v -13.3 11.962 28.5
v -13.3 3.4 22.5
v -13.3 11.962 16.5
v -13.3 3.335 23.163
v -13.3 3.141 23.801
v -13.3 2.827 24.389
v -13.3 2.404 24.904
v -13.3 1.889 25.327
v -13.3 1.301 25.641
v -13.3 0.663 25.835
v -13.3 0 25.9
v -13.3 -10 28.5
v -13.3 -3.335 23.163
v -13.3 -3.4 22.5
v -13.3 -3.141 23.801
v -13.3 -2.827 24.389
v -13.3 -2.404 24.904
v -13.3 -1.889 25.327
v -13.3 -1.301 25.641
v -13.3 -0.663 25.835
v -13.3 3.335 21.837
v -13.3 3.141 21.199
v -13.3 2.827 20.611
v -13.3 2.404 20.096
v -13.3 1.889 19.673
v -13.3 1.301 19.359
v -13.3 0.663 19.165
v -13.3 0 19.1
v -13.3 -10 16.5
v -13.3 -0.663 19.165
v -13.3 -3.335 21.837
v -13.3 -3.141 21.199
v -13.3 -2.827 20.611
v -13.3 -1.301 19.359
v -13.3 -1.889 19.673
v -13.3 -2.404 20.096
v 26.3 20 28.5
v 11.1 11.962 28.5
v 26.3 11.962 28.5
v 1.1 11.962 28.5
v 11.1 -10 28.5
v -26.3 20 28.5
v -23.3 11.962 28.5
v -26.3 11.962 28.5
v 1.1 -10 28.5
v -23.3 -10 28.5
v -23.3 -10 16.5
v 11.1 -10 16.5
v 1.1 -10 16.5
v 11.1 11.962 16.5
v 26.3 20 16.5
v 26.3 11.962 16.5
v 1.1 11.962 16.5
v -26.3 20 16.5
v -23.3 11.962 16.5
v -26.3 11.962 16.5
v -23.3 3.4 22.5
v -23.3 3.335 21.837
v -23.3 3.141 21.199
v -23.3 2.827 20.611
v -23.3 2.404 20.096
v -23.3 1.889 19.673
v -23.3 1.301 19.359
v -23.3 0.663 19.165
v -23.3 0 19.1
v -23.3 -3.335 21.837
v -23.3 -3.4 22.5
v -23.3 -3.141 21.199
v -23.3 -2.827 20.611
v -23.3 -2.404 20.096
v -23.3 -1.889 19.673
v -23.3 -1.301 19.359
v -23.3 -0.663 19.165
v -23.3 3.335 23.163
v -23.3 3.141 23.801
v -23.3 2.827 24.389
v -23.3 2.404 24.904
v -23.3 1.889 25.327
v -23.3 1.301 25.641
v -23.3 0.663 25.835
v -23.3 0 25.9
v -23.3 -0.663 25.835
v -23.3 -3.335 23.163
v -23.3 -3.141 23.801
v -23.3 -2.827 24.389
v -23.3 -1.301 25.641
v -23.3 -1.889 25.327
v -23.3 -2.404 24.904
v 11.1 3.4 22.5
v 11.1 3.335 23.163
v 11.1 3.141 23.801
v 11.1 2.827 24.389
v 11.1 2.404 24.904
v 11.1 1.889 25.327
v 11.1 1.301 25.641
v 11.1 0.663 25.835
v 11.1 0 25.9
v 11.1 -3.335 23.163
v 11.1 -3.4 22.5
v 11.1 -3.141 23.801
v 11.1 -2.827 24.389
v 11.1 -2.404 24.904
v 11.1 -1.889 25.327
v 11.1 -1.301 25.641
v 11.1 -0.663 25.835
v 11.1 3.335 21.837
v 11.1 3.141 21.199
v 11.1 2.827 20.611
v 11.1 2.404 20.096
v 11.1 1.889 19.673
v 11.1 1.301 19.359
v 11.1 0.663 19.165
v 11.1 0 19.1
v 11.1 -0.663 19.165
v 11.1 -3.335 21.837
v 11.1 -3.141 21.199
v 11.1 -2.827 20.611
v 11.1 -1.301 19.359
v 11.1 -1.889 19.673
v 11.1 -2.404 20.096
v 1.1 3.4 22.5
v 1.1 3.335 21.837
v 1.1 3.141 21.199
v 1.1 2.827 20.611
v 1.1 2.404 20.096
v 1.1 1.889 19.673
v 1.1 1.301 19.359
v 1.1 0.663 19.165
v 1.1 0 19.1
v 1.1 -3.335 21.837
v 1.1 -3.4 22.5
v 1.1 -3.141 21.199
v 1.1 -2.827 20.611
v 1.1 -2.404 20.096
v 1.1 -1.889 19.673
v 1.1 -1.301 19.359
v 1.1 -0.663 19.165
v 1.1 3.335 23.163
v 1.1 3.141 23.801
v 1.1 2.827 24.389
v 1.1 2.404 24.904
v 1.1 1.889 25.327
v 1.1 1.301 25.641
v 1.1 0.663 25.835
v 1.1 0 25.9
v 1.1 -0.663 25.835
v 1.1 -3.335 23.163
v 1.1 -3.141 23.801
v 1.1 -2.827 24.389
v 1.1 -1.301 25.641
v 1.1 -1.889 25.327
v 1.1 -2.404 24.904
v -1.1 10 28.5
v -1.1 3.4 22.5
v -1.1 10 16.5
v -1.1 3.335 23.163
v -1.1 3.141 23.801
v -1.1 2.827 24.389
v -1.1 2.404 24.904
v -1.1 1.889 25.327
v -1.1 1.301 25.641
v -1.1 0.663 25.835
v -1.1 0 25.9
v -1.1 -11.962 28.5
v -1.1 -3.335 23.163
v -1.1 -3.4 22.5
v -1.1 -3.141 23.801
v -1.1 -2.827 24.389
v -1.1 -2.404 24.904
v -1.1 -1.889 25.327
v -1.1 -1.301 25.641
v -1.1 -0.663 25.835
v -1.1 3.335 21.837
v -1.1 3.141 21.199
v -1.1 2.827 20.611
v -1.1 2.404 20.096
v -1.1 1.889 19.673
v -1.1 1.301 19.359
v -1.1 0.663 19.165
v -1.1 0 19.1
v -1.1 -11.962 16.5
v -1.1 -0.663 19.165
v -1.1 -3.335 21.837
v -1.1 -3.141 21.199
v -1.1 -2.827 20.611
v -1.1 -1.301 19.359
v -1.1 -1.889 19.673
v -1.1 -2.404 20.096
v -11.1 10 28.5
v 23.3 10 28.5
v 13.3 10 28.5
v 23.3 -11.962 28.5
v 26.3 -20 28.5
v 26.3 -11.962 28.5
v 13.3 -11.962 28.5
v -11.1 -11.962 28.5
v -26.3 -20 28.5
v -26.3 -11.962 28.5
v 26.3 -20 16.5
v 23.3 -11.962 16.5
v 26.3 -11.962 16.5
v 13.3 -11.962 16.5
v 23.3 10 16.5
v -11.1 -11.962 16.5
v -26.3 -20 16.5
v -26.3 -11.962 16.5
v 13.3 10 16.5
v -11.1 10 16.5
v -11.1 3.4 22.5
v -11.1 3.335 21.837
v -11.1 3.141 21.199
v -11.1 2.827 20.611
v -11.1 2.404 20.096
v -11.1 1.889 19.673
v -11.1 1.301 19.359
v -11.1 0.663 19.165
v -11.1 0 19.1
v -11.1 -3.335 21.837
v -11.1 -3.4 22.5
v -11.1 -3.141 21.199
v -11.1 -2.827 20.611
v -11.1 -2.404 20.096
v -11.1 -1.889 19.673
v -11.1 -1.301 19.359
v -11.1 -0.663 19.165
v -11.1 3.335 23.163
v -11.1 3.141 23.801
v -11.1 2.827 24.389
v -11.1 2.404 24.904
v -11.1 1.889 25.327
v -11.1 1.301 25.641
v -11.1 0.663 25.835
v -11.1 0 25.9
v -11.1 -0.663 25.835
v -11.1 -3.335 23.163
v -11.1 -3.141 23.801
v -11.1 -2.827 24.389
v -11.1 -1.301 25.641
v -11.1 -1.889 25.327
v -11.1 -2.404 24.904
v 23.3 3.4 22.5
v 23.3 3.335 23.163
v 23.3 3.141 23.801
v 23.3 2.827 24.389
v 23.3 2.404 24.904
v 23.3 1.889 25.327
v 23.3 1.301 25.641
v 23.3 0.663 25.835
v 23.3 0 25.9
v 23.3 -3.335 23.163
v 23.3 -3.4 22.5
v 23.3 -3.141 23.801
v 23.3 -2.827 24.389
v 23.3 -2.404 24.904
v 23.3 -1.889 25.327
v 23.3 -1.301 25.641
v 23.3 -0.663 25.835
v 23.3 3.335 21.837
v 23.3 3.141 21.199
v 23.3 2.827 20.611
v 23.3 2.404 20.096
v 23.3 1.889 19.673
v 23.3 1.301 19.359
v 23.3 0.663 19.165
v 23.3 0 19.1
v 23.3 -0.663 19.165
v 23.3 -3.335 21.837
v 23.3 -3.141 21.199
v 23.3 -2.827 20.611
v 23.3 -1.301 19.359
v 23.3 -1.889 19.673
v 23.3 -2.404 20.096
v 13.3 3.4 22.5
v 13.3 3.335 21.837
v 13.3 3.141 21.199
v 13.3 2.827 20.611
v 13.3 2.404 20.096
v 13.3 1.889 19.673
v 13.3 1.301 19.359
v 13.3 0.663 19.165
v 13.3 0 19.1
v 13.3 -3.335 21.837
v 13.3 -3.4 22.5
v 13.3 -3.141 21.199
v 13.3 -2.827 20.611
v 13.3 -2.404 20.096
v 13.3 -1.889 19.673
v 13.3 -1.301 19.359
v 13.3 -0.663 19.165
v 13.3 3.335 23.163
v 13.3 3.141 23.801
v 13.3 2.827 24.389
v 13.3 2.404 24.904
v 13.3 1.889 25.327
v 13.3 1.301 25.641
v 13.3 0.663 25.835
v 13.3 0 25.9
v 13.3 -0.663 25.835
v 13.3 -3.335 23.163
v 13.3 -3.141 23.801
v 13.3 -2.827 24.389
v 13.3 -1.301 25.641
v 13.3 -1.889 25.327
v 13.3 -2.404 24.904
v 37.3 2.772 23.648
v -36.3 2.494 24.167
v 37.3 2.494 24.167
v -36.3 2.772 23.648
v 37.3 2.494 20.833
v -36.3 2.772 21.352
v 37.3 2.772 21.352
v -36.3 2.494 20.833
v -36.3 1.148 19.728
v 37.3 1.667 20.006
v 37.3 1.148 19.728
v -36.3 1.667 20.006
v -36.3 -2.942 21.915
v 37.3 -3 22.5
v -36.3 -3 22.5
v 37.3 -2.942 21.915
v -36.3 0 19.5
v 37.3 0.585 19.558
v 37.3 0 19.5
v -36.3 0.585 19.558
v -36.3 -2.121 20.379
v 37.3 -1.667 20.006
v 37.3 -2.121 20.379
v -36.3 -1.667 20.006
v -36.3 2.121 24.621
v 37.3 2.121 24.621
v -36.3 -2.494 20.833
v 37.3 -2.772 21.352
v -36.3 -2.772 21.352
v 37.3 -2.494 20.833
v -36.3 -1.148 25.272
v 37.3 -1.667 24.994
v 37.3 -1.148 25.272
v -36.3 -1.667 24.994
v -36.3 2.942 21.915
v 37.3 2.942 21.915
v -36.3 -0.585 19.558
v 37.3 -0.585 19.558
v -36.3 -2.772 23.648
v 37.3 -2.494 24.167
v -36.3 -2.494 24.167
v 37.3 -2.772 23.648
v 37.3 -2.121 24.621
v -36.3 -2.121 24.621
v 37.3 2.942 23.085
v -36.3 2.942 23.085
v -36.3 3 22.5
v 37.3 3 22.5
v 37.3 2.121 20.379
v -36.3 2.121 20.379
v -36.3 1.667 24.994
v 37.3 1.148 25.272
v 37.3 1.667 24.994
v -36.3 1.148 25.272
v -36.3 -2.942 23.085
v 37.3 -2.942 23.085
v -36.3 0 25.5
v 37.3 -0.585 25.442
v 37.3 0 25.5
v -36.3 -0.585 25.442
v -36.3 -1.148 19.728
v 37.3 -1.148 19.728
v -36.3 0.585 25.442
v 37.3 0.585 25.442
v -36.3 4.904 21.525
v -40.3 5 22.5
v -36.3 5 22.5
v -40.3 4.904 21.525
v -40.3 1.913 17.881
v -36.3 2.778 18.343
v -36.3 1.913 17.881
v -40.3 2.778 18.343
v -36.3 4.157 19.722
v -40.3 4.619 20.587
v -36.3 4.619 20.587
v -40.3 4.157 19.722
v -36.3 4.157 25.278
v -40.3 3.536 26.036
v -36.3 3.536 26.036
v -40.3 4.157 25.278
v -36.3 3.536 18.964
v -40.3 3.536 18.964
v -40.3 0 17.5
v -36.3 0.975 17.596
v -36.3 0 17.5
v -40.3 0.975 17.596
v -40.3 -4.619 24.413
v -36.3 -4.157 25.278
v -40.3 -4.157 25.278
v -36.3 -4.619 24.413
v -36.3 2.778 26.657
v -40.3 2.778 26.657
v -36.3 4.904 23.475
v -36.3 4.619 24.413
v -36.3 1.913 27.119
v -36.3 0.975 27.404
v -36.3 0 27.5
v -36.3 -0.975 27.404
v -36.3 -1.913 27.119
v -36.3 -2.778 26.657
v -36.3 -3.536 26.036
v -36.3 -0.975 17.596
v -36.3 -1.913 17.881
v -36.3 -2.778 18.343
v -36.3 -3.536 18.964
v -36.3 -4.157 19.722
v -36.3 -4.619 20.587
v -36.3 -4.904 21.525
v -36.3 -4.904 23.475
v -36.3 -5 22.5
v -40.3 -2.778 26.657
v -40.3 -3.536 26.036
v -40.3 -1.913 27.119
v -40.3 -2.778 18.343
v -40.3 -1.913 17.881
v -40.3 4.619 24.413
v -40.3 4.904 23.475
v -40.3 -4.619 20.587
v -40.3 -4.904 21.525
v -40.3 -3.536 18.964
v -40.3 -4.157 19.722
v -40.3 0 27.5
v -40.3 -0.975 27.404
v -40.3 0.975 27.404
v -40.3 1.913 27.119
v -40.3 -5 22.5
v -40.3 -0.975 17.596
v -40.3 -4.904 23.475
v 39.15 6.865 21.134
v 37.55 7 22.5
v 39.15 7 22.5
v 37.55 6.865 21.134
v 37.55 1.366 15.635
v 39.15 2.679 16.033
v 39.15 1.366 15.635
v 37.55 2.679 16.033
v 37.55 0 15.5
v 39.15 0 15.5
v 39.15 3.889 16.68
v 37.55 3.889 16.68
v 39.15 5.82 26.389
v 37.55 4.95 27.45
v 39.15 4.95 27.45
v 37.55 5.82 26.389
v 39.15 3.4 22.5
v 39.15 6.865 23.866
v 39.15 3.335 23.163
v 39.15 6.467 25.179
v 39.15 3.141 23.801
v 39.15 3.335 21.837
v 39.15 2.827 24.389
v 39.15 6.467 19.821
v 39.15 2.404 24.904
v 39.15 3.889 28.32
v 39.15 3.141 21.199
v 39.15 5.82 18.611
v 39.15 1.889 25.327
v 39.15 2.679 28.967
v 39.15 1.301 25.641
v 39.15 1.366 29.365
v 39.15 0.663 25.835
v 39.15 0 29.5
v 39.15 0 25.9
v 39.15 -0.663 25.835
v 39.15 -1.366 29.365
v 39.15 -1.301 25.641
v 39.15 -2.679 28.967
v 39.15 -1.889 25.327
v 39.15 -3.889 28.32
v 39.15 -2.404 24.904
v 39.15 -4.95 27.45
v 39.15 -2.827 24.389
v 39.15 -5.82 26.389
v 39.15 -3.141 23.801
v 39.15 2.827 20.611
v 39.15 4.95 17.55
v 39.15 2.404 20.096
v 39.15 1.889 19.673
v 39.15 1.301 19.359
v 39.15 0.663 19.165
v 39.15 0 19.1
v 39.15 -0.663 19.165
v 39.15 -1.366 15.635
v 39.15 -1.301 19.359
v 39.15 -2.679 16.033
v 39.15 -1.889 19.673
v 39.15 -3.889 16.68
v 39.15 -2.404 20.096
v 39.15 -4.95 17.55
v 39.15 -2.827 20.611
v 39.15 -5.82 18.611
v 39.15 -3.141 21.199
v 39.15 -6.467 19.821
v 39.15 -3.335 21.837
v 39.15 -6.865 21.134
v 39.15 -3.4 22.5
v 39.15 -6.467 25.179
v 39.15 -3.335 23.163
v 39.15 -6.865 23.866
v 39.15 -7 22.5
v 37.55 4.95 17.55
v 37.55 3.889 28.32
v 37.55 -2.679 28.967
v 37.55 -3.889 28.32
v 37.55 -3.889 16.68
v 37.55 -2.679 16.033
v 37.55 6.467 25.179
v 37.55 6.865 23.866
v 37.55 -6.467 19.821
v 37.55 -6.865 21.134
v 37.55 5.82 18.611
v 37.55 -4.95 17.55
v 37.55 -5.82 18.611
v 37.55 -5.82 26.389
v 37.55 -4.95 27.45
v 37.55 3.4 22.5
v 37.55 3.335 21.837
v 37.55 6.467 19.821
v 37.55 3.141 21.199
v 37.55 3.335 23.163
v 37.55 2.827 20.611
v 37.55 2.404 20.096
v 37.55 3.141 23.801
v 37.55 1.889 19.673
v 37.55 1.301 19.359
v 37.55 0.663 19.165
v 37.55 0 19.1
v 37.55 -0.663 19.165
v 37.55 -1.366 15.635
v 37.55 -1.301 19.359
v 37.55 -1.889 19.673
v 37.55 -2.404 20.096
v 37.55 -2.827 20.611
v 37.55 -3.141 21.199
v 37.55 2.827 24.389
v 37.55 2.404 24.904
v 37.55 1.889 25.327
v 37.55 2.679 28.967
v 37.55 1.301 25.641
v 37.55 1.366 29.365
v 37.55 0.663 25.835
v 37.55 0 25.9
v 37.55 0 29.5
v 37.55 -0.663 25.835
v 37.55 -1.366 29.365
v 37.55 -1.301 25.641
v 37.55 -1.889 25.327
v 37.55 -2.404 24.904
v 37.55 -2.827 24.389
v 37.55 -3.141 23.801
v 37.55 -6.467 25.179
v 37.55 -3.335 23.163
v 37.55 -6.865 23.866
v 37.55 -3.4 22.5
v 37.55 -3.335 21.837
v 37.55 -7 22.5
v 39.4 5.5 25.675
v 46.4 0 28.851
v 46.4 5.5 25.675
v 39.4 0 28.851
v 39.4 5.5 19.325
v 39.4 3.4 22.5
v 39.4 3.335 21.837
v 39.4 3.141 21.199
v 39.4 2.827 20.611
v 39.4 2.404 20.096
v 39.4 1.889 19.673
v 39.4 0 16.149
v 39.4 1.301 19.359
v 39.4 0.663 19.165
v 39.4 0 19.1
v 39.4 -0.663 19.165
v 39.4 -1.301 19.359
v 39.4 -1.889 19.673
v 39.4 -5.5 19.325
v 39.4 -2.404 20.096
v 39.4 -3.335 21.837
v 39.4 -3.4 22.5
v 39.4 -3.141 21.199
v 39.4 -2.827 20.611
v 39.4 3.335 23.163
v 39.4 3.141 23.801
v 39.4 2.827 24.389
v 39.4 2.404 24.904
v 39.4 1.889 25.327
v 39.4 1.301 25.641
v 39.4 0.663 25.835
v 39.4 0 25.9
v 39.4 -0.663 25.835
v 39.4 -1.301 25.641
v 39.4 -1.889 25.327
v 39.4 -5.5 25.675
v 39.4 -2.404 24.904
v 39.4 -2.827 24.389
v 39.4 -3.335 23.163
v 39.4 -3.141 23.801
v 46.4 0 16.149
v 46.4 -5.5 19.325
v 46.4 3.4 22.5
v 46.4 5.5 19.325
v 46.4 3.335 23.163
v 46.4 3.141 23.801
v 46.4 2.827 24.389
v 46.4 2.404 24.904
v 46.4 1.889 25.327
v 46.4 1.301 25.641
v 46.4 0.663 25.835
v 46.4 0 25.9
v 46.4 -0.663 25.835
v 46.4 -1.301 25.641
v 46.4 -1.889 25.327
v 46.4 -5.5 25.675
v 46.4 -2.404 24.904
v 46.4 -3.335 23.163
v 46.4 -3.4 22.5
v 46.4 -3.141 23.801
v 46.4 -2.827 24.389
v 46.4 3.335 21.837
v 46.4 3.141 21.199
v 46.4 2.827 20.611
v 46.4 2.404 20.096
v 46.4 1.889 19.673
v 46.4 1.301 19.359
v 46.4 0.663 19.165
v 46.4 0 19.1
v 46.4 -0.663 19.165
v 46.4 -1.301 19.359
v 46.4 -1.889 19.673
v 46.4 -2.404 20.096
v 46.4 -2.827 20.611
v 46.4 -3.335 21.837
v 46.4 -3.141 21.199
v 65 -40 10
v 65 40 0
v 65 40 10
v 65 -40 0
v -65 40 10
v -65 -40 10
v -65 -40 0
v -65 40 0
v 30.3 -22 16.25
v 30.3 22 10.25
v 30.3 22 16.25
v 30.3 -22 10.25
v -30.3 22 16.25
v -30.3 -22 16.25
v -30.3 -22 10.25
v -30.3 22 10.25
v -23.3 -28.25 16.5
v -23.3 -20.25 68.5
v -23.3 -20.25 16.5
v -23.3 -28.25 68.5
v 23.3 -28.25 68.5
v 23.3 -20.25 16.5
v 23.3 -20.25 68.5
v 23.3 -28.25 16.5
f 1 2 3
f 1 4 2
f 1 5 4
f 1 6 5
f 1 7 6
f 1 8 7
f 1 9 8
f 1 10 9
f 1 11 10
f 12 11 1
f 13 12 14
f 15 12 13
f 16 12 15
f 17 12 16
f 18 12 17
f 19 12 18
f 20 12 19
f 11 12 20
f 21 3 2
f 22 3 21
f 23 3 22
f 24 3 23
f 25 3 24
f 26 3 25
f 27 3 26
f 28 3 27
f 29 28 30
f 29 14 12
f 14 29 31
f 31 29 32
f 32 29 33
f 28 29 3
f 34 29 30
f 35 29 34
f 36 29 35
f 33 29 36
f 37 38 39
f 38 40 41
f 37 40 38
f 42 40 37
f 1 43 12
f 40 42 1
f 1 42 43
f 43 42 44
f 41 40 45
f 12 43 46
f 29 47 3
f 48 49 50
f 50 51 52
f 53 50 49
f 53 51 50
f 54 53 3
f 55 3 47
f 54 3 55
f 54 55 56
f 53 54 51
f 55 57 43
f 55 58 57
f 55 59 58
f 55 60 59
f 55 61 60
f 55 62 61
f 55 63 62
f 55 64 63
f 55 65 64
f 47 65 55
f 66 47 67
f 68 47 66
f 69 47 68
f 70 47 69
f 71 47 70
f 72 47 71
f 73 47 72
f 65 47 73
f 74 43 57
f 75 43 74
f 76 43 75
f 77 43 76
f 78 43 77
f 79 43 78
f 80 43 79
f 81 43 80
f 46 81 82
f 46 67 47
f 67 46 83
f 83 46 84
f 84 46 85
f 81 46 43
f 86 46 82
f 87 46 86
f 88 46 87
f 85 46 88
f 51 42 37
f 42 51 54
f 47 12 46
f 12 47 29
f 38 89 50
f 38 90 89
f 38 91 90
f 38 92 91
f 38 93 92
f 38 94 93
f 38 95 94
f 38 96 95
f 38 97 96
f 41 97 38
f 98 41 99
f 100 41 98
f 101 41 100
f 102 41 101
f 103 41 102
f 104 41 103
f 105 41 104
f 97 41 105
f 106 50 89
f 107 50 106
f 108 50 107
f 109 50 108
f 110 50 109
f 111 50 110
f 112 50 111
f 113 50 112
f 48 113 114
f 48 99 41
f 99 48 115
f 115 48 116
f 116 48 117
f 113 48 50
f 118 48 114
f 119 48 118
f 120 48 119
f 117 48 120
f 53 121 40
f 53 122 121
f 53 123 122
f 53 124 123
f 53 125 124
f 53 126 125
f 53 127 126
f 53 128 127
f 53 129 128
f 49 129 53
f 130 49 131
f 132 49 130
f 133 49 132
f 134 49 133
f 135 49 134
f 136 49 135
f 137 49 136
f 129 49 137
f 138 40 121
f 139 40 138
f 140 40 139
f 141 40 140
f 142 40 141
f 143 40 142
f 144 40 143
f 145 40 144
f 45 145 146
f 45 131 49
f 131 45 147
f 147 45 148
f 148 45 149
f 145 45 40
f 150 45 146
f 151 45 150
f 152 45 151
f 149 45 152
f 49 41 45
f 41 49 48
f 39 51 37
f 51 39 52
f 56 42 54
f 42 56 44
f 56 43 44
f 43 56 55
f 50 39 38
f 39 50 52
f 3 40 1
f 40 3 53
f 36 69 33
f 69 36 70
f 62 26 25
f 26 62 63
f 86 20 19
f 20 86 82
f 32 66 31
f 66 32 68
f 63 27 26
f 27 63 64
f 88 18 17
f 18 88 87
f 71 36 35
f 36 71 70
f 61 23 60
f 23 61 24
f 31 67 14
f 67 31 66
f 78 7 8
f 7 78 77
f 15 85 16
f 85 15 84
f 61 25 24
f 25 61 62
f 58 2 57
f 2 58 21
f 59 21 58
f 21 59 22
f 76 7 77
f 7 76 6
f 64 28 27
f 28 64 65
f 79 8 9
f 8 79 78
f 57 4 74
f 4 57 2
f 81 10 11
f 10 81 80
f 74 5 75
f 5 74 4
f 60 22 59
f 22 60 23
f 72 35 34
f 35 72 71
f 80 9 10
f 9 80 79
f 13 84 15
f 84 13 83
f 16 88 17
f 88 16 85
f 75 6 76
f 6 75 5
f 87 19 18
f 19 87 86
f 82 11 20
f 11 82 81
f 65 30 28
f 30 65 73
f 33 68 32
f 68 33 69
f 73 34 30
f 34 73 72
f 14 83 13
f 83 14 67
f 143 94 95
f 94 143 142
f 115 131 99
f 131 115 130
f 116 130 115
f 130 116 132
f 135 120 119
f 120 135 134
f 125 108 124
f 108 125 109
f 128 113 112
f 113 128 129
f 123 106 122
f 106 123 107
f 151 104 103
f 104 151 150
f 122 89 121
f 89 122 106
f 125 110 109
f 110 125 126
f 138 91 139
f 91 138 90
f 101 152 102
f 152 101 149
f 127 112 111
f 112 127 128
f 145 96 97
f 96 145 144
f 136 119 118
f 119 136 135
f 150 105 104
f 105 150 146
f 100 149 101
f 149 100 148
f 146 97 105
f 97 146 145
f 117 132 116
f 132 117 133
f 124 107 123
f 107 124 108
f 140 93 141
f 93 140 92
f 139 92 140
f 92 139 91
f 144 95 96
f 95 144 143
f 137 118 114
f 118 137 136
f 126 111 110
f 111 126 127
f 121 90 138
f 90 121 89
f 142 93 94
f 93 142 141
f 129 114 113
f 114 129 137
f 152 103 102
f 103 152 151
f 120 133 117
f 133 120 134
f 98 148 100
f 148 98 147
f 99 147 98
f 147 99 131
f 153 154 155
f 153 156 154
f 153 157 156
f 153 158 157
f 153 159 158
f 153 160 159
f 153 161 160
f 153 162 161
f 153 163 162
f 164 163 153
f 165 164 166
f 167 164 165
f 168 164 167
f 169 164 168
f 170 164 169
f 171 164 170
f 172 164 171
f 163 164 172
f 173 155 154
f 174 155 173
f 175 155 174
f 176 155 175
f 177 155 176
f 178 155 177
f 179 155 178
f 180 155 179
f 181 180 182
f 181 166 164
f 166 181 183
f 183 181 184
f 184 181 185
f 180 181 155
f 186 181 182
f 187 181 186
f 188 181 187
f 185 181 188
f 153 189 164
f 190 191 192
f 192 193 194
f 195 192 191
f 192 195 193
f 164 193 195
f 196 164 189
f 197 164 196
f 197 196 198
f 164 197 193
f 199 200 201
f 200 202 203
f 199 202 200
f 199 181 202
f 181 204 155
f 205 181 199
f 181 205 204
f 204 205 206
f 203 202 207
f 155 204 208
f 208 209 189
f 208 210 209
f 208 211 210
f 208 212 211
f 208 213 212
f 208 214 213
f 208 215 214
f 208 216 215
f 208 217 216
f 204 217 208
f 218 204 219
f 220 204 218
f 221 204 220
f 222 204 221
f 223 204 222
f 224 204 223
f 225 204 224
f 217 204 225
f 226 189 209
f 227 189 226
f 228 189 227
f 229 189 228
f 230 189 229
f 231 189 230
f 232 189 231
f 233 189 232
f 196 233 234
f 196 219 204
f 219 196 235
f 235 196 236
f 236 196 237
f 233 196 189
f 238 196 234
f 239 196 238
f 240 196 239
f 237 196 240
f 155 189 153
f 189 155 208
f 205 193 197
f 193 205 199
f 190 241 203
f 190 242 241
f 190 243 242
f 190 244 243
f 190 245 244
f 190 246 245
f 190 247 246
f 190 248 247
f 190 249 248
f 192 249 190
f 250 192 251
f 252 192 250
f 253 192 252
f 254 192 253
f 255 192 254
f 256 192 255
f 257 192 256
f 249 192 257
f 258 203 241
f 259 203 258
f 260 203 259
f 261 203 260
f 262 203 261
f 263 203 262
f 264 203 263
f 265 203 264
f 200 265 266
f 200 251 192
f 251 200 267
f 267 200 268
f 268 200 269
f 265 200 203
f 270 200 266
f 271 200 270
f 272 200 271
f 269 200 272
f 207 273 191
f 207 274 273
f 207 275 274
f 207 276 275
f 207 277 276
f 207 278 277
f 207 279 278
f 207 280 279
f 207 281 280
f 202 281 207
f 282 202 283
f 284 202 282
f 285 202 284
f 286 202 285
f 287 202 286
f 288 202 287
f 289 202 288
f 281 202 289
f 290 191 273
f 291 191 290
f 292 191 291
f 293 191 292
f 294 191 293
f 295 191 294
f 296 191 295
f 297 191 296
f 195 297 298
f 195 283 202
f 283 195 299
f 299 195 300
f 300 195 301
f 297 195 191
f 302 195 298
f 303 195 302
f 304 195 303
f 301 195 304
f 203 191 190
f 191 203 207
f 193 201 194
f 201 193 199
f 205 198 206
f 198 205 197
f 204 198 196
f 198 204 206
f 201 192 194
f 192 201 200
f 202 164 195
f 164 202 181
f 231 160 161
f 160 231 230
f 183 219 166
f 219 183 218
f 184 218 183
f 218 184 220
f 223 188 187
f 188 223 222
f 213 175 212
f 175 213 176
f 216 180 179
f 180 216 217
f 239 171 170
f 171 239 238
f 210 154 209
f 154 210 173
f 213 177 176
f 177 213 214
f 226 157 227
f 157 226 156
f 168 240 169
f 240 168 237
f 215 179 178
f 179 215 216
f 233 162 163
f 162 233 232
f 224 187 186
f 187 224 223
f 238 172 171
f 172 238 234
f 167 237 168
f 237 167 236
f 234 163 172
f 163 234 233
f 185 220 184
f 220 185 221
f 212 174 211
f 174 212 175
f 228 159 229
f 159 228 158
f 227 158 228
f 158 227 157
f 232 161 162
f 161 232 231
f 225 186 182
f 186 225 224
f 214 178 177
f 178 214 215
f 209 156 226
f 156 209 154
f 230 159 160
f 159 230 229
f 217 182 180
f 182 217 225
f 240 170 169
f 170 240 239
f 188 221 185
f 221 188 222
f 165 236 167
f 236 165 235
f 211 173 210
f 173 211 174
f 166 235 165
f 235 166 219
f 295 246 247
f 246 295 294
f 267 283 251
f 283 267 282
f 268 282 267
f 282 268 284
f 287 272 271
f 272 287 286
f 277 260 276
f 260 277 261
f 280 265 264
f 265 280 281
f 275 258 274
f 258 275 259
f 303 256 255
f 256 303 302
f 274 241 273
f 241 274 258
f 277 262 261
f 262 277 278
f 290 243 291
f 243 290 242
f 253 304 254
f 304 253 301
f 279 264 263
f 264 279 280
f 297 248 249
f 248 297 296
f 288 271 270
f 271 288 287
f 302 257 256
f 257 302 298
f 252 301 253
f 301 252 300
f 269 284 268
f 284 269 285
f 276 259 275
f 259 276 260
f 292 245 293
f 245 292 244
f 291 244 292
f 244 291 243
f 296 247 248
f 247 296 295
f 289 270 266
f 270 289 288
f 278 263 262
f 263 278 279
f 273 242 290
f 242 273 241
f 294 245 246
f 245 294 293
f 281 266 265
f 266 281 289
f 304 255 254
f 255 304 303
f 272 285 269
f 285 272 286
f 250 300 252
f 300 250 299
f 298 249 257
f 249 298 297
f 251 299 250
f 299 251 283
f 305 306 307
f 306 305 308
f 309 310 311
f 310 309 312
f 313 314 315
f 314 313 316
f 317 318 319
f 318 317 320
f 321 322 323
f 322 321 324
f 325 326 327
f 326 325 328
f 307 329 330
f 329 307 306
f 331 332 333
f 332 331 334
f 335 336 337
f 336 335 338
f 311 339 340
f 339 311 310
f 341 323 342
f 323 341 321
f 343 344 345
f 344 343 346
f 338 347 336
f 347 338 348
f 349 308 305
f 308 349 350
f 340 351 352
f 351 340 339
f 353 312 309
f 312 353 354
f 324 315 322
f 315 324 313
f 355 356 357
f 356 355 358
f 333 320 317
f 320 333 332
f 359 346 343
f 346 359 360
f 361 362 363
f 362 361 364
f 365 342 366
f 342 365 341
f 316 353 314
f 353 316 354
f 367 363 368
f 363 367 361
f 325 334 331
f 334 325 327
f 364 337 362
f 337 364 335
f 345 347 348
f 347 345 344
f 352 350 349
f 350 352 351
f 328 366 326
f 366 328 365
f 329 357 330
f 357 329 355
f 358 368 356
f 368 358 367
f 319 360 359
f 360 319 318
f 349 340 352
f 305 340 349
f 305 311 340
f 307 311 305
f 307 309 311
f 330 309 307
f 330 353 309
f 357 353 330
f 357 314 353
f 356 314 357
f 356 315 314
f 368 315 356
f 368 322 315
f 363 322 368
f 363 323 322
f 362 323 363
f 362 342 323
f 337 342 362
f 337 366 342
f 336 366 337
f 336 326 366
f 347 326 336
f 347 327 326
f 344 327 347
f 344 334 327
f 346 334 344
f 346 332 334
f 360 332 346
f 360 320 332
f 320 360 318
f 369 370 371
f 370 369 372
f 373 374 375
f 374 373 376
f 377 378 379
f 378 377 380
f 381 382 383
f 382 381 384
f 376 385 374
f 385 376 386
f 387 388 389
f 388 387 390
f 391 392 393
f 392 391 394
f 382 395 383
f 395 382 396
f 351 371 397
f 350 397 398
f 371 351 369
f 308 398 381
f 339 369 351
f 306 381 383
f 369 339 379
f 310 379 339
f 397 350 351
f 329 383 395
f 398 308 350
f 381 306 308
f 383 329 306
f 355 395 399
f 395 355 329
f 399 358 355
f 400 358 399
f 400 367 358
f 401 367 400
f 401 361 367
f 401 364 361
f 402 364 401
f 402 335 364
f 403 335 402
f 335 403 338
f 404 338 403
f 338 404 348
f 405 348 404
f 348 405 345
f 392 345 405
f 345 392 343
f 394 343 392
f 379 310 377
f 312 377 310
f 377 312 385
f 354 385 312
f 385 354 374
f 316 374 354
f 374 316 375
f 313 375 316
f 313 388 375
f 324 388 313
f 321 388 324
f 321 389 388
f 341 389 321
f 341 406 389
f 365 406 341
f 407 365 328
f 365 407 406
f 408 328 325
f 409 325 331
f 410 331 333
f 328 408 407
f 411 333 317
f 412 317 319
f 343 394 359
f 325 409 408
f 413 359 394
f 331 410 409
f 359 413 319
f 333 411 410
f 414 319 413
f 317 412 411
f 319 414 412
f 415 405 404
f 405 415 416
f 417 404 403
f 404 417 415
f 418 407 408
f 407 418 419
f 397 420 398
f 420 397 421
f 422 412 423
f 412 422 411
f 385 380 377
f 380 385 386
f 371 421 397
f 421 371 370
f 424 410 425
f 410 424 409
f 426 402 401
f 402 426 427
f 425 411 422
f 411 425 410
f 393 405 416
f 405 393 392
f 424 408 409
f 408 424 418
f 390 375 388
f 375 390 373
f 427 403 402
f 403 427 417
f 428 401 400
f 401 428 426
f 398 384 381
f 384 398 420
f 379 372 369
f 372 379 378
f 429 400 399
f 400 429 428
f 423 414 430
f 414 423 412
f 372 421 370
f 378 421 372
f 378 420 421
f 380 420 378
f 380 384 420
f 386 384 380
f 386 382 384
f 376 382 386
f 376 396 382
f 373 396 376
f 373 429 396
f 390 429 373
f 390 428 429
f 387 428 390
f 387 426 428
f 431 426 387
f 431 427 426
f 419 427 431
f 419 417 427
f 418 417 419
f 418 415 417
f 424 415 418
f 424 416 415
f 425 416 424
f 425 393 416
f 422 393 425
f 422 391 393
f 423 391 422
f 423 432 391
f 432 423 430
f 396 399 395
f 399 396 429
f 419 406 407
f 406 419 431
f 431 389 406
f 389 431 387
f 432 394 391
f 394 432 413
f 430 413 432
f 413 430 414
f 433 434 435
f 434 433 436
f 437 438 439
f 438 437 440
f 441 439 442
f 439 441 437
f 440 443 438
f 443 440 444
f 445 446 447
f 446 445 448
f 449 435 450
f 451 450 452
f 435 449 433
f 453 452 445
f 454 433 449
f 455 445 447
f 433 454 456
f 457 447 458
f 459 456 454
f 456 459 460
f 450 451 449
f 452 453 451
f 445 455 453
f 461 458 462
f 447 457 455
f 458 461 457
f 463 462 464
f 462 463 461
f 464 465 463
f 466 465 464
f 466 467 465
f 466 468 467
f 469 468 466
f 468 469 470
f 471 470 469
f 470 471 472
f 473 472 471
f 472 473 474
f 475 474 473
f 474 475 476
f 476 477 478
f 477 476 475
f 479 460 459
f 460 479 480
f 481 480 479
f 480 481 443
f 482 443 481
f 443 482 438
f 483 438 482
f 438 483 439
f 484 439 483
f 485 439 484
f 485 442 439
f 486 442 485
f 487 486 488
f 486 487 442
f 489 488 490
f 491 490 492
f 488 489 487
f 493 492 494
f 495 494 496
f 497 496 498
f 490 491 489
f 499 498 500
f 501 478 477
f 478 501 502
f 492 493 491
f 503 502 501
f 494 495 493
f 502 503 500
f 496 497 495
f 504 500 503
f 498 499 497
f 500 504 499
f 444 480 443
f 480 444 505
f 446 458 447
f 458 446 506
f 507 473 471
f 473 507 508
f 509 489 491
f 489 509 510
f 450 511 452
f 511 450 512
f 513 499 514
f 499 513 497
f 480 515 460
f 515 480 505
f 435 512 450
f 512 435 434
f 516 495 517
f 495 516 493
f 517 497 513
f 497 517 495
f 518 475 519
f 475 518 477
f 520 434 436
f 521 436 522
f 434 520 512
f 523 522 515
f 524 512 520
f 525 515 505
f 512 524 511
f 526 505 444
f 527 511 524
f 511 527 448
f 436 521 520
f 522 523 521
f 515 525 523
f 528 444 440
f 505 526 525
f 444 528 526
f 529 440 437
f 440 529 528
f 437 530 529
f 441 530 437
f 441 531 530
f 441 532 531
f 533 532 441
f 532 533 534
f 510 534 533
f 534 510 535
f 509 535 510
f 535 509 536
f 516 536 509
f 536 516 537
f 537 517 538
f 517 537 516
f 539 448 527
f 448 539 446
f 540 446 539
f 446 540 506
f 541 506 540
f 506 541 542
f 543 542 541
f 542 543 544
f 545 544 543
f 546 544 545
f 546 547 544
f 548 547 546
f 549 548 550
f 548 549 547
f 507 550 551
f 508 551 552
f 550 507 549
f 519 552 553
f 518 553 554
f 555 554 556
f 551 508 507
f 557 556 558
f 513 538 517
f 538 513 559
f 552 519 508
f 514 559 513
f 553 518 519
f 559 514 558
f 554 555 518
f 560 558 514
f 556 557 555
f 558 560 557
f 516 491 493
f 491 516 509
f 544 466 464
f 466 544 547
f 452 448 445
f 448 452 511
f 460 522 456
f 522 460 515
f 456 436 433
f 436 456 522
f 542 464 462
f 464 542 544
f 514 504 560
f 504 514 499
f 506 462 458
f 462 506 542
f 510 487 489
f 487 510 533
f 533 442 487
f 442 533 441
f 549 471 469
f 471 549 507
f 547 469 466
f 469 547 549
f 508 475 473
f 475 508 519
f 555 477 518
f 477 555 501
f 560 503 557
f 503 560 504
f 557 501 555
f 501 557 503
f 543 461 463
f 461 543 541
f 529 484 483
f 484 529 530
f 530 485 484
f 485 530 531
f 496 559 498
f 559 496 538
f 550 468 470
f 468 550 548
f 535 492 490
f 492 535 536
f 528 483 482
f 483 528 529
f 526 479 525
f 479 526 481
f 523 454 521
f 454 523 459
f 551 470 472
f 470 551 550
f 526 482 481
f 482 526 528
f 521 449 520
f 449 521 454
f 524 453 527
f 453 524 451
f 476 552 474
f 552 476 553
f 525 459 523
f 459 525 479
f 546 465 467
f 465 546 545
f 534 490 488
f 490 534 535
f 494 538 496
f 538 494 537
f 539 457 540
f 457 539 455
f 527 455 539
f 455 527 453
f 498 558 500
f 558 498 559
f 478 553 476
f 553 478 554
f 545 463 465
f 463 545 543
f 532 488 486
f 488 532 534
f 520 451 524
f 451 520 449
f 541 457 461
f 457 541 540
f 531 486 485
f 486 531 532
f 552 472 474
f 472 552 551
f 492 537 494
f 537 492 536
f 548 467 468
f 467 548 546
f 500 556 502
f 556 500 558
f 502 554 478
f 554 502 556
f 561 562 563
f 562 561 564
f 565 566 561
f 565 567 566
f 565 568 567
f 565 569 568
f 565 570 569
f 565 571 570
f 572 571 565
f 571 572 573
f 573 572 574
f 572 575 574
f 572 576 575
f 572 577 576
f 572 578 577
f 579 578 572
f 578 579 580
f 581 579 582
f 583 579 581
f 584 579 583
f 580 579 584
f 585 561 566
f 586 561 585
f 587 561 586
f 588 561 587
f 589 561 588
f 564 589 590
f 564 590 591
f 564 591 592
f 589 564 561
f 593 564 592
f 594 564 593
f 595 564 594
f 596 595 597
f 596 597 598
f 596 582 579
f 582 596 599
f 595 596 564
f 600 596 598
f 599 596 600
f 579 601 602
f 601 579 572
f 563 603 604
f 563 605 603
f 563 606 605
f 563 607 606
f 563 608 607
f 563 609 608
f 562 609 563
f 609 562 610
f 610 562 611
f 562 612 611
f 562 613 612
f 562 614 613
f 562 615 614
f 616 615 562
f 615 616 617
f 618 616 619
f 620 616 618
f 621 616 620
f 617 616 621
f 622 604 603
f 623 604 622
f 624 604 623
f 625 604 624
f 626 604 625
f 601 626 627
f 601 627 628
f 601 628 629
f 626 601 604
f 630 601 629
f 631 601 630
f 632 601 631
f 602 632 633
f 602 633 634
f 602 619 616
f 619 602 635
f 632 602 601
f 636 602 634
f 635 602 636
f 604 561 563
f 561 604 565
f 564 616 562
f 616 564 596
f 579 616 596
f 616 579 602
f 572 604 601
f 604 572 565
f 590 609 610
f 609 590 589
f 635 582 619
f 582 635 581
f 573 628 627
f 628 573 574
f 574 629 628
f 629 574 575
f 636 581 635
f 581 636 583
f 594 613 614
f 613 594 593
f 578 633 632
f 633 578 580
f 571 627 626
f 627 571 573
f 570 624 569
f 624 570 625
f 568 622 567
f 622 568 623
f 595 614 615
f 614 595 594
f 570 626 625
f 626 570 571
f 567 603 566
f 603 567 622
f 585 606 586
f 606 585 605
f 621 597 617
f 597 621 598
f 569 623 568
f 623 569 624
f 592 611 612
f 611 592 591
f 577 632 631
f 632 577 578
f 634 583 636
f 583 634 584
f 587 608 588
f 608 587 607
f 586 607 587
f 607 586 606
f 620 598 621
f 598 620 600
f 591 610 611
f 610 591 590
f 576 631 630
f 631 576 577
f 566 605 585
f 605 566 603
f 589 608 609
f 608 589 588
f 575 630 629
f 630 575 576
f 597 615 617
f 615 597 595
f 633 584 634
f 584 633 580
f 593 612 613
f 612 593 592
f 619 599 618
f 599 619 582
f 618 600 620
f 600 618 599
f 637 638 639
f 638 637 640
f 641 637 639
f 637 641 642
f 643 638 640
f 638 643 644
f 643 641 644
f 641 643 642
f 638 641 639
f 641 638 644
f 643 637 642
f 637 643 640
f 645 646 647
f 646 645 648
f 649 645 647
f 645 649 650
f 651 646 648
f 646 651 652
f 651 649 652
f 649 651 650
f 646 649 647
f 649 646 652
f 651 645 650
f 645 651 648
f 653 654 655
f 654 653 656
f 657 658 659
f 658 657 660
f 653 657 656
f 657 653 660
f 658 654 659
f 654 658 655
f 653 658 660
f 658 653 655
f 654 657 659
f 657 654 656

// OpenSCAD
$fn = 32;

// ------------------------------------------------------------------------
// Comb hinge with flap: leaf 52.6 x 20 mm, pin d6, flap 52 mm
// Every part is its own module, assembly() places every instance.
// ------------------------------------------------------------------------

// --- part 1 ---
module hinge_bed() {
  difference() {
    translate([-65, -40, 0]) cube([130, 80, 10]);
  }
}

// --- part 2 ---
module hinge_riser() {
  difference() {
    translate([-30.3, -22, 0]) cube([60.6, 44, 6]);
  }
}

// --- part 3 ---
module hinge_leaf_a() {
  difference() {
    union() {
      translate([-23.3, -10, -6]) cube([10, 30, 12]);
      translate([1.1, -10, -6]) cube([10, 30, 12]);
      translate([-26.3, 11.962, -6]) cube([52.6, 8.038, 12]);
    }
    translate([-18.3, 0, 0]) rotate([0, 90, 0]) cylinder(h = 12, d = 6.8, center = true);
    translate([6.1, 0, 0]) rotate([0, 90, 0]) cylinder(h = 12, d = 6.8, center = true);
  }
}

// --- part 4 ---
module hinge_leaf_b() {
  difference() {
    union() {
      translate([-11.1, -20, -6]) cube([10, 30, 12]);
      translate([13.3, -20, -6]) cube([10, 30, 12]);
      translate([-26.3, -20, -6]) cube([52.6, 8.038, 12]);
    }
    translate([-6.1, 0, 0]) rotate([0, 90, 0]) cylinder(h = 12, d = 6.8, center = true);
    translate([18.3, 0, 0]) rotate([0, 90, 0]) cylinder(h = 12, d = 6.8, center = true);
  }
}

// --- part 5 ---
module hinge_flap() {
  difference() {
    translate([-23.3, -26, 0]) cube([46.6, 52, 8]);
  }
}

// --- part 6 ---
module hinge_pin() {
  rotate([0, 90, 0]) cylinder(h = 74.6, d = 6, center = true);
  translate([-40.3, 0, 0]) rotate([0, 90, 0]) cylinder(h = 4, d = 10);
}

// --- part 7 ---
module pin_washer() {
  difference() {
      translate([0, 0, 0]) cylinder(h = 1.6, d = 14);
      translate([0, 0, -1]) cylinder(h = 3.6, d = 6.8);
    }
}

// --- part 8 ---
module pin_nut() {
  difference() {
    linear_extrude(height = 7) polygon(points = [[6.351, 0], [3.175, 5.5], [-3.175, 5.5], [-6.351, 0], [-3.175, -5.5], [3.175, -5.5]]);
    translate([0, 0, -1]) cylinder(h = 9, d = 6.8);
  }
}

// --- assembly ---
module assembly() {
  color([0.80, 0.24, 0.20]) translate([0, 0, 0]) rotate([0, 0, 0]) hinge_bed();
  color([0.20, 0.45, 0.75]) translate([0, 0, 10.25]) rotate([0, 0, 0]) hinge_riser();
  color([0.25, 0.62, 0.32]) translate([0, 0, 22.5]) rotate([0, 0, 0]) hinge_leaf_a();
  color([0.92, 0.70, 0.18]) translate([0, 0, 22.5]) rotate([0, 0, 0]) hinge_leaf_b();
  color([0.58, 0.35, 0.70]) translate([0, -20.25, 42.5]) rotate([90, 0, 0]) hinge_flap();
  color([0.16, 0.66, 0.66]) translate([0, 0, 22.5]) rotate([0, 0, 0]) hinge_pin();
  color([0.85, 0.48, 0.18]) translate([37.55, 0, 22.5]) rotate([0, 90, 0]) pin_washer();
  color([0.55, 0.60, 0.65]) translate([39.4, 0, 22.5]) rotate([0, 90, 0]) pin_nut();
}

assembly();
